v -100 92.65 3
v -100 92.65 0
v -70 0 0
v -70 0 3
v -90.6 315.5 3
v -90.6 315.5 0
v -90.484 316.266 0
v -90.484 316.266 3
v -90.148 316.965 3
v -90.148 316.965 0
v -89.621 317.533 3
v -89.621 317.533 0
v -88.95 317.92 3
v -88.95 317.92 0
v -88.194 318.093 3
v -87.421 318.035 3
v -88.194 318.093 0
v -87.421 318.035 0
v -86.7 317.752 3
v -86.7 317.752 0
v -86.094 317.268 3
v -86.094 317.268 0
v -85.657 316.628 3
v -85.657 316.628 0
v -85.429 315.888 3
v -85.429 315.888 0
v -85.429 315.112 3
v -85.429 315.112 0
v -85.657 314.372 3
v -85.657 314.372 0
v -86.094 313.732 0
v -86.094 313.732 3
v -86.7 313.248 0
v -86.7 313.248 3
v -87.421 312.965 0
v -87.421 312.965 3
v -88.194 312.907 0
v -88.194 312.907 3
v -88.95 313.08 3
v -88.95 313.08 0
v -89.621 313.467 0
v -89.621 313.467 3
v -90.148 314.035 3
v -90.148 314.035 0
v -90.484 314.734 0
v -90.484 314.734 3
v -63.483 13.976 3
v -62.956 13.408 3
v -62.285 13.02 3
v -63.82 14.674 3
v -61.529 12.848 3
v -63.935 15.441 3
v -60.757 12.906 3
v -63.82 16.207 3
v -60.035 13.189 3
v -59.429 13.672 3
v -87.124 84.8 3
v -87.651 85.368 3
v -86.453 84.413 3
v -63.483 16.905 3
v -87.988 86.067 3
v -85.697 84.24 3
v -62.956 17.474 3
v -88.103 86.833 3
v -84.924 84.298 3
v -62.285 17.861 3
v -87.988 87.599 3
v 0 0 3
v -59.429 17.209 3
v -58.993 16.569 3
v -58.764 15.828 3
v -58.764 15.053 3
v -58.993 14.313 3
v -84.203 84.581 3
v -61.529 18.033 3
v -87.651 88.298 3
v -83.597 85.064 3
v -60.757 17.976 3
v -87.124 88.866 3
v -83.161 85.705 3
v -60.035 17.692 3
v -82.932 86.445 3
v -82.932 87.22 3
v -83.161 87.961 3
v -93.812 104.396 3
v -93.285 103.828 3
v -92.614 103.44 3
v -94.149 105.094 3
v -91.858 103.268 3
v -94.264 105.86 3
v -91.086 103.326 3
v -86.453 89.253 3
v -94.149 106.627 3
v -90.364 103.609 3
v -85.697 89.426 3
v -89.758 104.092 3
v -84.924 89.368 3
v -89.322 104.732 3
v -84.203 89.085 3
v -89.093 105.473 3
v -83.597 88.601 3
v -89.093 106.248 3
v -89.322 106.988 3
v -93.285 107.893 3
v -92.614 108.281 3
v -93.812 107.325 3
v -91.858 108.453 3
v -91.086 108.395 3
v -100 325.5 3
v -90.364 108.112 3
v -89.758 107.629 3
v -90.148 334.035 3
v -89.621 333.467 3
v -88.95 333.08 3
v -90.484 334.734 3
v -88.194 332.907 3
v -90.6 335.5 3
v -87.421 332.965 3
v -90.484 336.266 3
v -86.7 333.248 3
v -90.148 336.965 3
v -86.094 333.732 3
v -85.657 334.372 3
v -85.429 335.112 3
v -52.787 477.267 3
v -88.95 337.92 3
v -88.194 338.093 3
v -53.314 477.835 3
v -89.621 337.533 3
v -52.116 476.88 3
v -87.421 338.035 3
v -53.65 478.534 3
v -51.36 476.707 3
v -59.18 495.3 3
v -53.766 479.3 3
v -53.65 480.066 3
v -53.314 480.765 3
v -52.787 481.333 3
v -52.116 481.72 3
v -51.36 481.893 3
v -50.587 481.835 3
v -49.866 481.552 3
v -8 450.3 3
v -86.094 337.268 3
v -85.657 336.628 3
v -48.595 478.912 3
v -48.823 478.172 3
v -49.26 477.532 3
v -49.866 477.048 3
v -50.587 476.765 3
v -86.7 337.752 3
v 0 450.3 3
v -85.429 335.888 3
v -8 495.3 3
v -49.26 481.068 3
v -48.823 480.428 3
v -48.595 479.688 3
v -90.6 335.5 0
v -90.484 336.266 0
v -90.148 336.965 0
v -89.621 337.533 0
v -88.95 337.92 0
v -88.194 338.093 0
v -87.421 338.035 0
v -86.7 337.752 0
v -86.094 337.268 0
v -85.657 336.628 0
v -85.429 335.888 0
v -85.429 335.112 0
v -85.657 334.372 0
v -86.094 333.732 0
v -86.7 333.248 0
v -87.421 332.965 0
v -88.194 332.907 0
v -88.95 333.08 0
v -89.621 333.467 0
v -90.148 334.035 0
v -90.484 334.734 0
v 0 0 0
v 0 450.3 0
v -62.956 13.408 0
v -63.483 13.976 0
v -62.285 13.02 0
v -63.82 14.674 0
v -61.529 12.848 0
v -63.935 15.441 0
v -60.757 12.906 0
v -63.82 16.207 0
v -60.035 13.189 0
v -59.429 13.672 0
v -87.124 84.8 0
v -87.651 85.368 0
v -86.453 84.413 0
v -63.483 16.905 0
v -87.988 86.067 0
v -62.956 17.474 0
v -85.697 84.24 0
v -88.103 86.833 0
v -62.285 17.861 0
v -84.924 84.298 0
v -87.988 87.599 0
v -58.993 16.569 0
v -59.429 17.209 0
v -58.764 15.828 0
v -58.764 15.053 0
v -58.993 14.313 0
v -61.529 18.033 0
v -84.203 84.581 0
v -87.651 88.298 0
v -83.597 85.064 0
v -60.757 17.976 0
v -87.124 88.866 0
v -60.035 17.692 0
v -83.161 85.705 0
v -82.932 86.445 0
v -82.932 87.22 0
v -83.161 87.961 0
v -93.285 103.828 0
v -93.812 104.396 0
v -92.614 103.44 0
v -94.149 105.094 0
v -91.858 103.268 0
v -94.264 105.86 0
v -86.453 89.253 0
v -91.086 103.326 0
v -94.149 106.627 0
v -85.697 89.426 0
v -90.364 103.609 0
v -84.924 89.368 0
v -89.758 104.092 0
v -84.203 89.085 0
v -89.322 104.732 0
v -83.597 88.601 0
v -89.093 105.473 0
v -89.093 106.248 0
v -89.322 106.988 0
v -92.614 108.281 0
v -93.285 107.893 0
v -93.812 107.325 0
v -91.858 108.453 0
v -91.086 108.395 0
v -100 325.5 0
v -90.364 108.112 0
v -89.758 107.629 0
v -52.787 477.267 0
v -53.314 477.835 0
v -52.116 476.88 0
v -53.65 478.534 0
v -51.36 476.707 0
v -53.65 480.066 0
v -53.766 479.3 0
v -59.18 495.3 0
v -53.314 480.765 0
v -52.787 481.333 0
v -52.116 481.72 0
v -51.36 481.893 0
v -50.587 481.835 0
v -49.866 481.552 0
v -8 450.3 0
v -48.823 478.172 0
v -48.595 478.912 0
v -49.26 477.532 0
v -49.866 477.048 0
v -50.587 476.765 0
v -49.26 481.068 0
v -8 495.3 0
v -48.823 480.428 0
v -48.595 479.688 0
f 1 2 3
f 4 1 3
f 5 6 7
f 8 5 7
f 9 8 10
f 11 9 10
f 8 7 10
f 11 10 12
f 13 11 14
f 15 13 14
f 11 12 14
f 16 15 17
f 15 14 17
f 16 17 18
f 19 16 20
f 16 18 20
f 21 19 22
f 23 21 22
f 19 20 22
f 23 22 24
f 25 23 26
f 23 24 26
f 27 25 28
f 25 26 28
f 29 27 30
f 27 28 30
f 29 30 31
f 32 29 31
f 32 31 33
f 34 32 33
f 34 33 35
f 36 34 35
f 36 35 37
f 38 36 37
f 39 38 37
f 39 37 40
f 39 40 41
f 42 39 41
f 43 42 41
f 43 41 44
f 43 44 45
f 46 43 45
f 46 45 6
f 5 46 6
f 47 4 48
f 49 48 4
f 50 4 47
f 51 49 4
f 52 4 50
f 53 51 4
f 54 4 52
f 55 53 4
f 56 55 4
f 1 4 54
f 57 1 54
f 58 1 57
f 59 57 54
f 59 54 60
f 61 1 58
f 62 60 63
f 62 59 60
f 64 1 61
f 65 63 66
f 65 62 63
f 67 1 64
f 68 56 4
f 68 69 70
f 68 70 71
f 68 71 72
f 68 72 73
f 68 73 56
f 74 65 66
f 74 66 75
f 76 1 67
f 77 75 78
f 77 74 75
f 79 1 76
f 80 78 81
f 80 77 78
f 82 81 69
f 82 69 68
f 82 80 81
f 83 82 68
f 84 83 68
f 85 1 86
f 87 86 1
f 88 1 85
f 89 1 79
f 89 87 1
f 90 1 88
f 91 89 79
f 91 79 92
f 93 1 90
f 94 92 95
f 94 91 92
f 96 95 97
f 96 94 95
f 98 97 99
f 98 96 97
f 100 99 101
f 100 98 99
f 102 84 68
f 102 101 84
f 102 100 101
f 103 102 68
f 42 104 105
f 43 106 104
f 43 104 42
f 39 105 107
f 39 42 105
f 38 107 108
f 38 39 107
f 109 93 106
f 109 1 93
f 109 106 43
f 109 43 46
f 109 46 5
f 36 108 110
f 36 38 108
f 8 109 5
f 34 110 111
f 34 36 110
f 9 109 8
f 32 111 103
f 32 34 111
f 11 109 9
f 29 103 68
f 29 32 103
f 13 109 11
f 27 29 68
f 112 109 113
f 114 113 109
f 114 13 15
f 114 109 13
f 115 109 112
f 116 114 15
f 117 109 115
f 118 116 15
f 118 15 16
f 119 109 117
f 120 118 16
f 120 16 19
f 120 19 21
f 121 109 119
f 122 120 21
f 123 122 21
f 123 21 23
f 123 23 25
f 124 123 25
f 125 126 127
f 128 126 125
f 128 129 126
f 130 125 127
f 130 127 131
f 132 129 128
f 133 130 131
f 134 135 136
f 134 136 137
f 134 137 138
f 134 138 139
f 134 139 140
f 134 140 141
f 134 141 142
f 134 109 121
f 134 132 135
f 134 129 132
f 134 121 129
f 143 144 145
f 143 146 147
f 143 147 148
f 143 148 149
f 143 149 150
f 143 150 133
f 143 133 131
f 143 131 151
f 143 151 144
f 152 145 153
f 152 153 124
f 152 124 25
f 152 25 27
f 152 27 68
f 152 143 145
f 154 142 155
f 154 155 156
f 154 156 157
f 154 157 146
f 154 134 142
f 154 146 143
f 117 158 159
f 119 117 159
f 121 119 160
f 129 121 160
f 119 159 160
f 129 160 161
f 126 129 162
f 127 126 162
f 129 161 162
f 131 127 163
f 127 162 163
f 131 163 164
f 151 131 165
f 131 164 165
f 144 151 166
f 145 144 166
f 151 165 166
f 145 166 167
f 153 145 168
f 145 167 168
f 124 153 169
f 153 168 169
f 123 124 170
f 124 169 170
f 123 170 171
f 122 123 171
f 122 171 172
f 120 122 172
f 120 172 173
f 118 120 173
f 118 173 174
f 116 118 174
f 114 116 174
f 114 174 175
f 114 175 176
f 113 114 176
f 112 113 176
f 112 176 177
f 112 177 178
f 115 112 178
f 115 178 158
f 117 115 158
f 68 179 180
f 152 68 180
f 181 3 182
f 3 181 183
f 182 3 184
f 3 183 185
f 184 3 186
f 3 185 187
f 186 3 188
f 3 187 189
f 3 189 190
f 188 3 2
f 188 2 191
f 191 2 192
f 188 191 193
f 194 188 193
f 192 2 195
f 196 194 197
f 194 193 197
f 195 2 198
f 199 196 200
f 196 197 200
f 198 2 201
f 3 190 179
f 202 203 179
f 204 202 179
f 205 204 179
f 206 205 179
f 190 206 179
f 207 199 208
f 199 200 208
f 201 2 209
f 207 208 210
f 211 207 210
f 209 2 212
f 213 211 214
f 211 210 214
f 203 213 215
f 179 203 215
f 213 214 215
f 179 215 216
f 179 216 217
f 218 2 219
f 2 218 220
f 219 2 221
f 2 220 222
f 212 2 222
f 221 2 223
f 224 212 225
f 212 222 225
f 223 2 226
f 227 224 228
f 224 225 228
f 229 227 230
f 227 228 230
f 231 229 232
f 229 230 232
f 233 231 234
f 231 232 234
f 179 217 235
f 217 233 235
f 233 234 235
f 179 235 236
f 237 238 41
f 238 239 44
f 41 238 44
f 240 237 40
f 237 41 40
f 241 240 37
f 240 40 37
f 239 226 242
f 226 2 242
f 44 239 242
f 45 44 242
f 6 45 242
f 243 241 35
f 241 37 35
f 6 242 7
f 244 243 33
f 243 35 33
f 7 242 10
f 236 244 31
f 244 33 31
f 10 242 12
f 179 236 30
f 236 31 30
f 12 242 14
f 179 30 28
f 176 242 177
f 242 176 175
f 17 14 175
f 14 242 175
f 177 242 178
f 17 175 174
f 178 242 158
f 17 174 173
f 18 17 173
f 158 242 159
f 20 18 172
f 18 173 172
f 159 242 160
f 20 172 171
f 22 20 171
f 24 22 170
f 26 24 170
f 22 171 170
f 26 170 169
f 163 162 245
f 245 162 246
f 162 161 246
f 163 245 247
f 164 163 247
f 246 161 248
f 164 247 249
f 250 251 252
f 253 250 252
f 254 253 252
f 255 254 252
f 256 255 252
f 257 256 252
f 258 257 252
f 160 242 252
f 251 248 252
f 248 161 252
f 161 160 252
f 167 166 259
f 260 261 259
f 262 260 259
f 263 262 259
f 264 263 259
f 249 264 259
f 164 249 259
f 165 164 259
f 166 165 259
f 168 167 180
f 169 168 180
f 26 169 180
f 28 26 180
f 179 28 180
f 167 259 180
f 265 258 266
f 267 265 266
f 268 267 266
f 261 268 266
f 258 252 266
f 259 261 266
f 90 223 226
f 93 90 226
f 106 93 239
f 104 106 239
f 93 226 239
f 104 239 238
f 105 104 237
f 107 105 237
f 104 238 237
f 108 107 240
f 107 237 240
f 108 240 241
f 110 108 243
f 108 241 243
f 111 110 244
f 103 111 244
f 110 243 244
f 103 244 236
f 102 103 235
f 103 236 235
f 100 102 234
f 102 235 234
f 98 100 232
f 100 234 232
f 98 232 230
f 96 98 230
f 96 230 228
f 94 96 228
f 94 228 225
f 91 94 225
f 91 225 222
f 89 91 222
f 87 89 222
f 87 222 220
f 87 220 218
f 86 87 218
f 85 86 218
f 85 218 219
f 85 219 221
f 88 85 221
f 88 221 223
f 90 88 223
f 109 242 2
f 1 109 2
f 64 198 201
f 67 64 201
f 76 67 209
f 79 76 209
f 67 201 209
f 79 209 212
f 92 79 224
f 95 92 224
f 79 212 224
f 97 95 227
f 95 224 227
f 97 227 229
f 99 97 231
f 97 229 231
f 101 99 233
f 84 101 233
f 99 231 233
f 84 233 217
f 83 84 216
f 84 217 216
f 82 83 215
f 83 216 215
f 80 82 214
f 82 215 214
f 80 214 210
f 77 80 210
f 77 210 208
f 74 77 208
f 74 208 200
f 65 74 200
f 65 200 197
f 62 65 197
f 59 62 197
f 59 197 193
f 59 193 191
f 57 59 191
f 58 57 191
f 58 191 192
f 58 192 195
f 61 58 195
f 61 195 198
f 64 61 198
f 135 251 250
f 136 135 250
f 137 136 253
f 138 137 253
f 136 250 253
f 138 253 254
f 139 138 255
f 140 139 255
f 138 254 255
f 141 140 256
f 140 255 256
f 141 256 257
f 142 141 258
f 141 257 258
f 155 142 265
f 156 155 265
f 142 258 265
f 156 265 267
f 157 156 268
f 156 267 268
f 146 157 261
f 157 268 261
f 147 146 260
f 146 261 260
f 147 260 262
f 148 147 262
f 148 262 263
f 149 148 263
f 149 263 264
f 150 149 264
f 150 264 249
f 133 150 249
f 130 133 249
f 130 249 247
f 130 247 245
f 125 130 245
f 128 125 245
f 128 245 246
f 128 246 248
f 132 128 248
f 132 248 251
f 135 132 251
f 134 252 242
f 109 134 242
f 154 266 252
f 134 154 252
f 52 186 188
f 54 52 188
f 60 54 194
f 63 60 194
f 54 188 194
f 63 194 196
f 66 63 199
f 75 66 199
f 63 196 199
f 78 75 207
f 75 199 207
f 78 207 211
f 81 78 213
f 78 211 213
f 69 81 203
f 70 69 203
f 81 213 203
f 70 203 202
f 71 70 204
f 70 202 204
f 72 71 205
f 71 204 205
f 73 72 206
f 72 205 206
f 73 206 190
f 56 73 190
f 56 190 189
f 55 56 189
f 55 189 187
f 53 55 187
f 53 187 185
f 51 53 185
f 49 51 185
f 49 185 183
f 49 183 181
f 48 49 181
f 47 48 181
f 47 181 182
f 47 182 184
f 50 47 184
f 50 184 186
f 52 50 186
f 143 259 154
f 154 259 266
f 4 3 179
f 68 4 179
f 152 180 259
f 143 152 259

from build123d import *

# Parameters (mm, degrees)
BOSS_EXTRU_1_DEPTH      = 3
ESQUISSE2_R             = 2.6
ENL_V_MAT_EXTRU_1_DEPTH = 20


with BuildPart() as part:
    # Esquisse1 → Boss.-Extru.1 (new body)
    with BuildSketch(Plane.XY):
        Polygon((0, 450.3), (-8, 450.3), (-8, 495.3), (-59.18, 495.3), (-100, 325.5), (-100, 92.65), (-70, 0), (0, 0), align=None)
    extrude(amount=BOSS_EXTRU_1_DEPTH)

    # Esquisse2 → Enlèv. mat.-Extru.1 (cut)
    with BuildSketch(Plane(origin=(0, 0, 0), x_dir=(-1, 0, 0), z_dir=(0, 0, -1))):
        with Locations((61.335187385, 15.440747023)):
            Circle(ESQUISSE2_R)
        with Locations((85.503041698, 86.832938888)):
            Circle(ESQUISSE2_R)
        with Locations((91.66409495, 105.860325015)):
            Circle(ESQUISSE2_R)
        with Locations((88, 315.5)):
            Circle(ESQUISSE2_R)
        with Locations((88, 335.5)):
            Circle(ESQUISSE2_R)
        with Locations((51.165806832, 479.3)):
            Circle(ESQUISSE2_R)
    extrude(amount=-ENL_V_MAT_EXTRU_1_DEPTH, mode=Mode.SUBTRACT)


solid = part.part
